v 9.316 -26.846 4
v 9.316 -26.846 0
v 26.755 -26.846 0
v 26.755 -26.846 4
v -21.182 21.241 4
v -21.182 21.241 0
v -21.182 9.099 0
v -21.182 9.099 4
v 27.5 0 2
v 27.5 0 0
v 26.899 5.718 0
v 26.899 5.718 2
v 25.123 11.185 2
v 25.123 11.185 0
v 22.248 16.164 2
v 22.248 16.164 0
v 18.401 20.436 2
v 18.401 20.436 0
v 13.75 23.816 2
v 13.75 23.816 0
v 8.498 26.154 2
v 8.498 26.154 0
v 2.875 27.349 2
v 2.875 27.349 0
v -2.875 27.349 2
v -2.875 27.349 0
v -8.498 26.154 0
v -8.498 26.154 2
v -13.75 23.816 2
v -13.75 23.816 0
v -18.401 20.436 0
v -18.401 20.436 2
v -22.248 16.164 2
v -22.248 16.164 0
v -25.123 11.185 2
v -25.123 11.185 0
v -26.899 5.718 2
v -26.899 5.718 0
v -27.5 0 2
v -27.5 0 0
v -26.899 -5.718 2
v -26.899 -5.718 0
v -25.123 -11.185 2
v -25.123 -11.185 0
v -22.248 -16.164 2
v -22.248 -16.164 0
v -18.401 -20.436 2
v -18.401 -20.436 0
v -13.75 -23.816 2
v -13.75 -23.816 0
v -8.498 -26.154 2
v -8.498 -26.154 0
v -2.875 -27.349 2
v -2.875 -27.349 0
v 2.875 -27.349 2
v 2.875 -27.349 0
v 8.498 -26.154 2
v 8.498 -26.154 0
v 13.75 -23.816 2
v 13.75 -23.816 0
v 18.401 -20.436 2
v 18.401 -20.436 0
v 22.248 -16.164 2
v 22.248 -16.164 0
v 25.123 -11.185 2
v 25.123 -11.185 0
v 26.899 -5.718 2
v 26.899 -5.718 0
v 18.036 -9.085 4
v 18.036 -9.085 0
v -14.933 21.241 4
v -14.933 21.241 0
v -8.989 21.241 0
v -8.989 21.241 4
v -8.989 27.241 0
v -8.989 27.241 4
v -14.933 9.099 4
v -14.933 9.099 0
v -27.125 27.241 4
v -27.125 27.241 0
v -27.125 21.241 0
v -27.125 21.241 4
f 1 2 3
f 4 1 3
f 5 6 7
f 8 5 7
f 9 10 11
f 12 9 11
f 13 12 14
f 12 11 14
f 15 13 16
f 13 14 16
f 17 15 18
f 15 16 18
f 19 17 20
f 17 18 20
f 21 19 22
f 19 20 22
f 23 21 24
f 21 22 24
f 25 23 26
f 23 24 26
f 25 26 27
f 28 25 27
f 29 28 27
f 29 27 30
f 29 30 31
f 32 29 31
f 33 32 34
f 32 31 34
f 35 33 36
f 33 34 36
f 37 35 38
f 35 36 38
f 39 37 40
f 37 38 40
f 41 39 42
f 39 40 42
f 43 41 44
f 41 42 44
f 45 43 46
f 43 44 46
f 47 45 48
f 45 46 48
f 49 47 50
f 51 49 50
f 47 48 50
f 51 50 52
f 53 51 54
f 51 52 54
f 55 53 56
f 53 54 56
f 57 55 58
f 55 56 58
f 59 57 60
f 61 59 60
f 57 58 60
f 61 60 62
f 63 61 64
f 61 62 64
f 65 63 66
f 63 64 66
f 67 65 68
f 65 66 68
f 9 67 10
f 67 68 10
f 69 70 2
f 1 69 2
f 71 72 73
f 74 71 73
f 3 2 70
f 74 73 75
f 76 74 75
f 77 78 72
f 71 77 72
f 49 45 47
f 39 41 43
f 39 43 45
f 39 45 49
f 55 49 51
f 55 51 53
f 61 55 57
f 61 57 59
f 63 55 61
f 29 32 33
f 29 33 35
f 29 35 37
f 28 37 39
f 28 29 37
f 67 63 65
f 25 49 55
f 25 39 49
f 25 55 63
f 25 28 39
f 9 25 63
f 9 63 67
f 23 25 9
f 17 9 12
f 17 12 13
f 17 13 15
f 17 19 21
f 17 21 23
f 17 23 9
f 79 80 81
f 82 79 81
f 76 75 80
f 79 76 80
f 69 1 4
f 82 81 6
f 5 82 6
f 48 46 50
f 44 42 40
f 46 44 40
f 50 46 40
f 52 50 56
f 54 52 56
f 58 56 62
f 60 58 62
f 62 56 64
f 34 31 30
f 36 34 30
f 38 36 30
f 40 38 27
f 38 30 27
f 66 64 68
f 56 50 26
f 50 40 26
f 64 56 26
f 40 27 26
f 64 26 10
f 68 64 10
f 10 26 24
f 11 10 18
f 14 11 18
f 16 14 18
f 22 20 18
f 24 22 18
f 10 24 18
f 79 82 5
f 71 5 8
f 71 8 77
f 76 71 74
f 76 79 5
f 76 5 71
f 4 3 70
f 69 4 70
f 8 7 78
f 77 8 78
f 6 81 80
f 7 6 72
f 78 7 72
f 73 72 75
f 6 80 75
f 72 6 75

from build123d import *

# Parameters (mm, degrees)
F0_R     = 27.5
F2_DEPTH = 2
F3_DEPTH = 4
F4_DEPTH = 4


with BuildPart() as f2:
    # F0 (on Top) → F2 (new body)
    with BuildSketch(Plane.XY):
        Circle(F0_R)
    extrude(amount=F2_DEPTH)


with BuildPart() as f3:
    # F1 (on Top) → F3 (new body)
    with BuildSketch(Plane.XY):
        Polygon((-8.989121, 27.241041), (-27.125331, 27.241041), (-27.125331, 21.241041), (-21.181531, 21.241041), (-21.181531, 9.099432), (-14.93292, 9.099432), (-14.93292, 21.241041), (-8.989121, 21.241041), align=None)
    extrude(amount=F3_DEPTH)


with BuildPart() as f4:
    # F1 (on Top) → F4 (new body)
    with BuildSketch(Plane.XY):
        Polygon((26.75489, -26.846478), (18.035639, -9.085041), (9.316389, -26.846478), align=None)
    extrude(amount=F4_DEPTH)


solid = Compound([f2.part, f3.part, f4.part])
